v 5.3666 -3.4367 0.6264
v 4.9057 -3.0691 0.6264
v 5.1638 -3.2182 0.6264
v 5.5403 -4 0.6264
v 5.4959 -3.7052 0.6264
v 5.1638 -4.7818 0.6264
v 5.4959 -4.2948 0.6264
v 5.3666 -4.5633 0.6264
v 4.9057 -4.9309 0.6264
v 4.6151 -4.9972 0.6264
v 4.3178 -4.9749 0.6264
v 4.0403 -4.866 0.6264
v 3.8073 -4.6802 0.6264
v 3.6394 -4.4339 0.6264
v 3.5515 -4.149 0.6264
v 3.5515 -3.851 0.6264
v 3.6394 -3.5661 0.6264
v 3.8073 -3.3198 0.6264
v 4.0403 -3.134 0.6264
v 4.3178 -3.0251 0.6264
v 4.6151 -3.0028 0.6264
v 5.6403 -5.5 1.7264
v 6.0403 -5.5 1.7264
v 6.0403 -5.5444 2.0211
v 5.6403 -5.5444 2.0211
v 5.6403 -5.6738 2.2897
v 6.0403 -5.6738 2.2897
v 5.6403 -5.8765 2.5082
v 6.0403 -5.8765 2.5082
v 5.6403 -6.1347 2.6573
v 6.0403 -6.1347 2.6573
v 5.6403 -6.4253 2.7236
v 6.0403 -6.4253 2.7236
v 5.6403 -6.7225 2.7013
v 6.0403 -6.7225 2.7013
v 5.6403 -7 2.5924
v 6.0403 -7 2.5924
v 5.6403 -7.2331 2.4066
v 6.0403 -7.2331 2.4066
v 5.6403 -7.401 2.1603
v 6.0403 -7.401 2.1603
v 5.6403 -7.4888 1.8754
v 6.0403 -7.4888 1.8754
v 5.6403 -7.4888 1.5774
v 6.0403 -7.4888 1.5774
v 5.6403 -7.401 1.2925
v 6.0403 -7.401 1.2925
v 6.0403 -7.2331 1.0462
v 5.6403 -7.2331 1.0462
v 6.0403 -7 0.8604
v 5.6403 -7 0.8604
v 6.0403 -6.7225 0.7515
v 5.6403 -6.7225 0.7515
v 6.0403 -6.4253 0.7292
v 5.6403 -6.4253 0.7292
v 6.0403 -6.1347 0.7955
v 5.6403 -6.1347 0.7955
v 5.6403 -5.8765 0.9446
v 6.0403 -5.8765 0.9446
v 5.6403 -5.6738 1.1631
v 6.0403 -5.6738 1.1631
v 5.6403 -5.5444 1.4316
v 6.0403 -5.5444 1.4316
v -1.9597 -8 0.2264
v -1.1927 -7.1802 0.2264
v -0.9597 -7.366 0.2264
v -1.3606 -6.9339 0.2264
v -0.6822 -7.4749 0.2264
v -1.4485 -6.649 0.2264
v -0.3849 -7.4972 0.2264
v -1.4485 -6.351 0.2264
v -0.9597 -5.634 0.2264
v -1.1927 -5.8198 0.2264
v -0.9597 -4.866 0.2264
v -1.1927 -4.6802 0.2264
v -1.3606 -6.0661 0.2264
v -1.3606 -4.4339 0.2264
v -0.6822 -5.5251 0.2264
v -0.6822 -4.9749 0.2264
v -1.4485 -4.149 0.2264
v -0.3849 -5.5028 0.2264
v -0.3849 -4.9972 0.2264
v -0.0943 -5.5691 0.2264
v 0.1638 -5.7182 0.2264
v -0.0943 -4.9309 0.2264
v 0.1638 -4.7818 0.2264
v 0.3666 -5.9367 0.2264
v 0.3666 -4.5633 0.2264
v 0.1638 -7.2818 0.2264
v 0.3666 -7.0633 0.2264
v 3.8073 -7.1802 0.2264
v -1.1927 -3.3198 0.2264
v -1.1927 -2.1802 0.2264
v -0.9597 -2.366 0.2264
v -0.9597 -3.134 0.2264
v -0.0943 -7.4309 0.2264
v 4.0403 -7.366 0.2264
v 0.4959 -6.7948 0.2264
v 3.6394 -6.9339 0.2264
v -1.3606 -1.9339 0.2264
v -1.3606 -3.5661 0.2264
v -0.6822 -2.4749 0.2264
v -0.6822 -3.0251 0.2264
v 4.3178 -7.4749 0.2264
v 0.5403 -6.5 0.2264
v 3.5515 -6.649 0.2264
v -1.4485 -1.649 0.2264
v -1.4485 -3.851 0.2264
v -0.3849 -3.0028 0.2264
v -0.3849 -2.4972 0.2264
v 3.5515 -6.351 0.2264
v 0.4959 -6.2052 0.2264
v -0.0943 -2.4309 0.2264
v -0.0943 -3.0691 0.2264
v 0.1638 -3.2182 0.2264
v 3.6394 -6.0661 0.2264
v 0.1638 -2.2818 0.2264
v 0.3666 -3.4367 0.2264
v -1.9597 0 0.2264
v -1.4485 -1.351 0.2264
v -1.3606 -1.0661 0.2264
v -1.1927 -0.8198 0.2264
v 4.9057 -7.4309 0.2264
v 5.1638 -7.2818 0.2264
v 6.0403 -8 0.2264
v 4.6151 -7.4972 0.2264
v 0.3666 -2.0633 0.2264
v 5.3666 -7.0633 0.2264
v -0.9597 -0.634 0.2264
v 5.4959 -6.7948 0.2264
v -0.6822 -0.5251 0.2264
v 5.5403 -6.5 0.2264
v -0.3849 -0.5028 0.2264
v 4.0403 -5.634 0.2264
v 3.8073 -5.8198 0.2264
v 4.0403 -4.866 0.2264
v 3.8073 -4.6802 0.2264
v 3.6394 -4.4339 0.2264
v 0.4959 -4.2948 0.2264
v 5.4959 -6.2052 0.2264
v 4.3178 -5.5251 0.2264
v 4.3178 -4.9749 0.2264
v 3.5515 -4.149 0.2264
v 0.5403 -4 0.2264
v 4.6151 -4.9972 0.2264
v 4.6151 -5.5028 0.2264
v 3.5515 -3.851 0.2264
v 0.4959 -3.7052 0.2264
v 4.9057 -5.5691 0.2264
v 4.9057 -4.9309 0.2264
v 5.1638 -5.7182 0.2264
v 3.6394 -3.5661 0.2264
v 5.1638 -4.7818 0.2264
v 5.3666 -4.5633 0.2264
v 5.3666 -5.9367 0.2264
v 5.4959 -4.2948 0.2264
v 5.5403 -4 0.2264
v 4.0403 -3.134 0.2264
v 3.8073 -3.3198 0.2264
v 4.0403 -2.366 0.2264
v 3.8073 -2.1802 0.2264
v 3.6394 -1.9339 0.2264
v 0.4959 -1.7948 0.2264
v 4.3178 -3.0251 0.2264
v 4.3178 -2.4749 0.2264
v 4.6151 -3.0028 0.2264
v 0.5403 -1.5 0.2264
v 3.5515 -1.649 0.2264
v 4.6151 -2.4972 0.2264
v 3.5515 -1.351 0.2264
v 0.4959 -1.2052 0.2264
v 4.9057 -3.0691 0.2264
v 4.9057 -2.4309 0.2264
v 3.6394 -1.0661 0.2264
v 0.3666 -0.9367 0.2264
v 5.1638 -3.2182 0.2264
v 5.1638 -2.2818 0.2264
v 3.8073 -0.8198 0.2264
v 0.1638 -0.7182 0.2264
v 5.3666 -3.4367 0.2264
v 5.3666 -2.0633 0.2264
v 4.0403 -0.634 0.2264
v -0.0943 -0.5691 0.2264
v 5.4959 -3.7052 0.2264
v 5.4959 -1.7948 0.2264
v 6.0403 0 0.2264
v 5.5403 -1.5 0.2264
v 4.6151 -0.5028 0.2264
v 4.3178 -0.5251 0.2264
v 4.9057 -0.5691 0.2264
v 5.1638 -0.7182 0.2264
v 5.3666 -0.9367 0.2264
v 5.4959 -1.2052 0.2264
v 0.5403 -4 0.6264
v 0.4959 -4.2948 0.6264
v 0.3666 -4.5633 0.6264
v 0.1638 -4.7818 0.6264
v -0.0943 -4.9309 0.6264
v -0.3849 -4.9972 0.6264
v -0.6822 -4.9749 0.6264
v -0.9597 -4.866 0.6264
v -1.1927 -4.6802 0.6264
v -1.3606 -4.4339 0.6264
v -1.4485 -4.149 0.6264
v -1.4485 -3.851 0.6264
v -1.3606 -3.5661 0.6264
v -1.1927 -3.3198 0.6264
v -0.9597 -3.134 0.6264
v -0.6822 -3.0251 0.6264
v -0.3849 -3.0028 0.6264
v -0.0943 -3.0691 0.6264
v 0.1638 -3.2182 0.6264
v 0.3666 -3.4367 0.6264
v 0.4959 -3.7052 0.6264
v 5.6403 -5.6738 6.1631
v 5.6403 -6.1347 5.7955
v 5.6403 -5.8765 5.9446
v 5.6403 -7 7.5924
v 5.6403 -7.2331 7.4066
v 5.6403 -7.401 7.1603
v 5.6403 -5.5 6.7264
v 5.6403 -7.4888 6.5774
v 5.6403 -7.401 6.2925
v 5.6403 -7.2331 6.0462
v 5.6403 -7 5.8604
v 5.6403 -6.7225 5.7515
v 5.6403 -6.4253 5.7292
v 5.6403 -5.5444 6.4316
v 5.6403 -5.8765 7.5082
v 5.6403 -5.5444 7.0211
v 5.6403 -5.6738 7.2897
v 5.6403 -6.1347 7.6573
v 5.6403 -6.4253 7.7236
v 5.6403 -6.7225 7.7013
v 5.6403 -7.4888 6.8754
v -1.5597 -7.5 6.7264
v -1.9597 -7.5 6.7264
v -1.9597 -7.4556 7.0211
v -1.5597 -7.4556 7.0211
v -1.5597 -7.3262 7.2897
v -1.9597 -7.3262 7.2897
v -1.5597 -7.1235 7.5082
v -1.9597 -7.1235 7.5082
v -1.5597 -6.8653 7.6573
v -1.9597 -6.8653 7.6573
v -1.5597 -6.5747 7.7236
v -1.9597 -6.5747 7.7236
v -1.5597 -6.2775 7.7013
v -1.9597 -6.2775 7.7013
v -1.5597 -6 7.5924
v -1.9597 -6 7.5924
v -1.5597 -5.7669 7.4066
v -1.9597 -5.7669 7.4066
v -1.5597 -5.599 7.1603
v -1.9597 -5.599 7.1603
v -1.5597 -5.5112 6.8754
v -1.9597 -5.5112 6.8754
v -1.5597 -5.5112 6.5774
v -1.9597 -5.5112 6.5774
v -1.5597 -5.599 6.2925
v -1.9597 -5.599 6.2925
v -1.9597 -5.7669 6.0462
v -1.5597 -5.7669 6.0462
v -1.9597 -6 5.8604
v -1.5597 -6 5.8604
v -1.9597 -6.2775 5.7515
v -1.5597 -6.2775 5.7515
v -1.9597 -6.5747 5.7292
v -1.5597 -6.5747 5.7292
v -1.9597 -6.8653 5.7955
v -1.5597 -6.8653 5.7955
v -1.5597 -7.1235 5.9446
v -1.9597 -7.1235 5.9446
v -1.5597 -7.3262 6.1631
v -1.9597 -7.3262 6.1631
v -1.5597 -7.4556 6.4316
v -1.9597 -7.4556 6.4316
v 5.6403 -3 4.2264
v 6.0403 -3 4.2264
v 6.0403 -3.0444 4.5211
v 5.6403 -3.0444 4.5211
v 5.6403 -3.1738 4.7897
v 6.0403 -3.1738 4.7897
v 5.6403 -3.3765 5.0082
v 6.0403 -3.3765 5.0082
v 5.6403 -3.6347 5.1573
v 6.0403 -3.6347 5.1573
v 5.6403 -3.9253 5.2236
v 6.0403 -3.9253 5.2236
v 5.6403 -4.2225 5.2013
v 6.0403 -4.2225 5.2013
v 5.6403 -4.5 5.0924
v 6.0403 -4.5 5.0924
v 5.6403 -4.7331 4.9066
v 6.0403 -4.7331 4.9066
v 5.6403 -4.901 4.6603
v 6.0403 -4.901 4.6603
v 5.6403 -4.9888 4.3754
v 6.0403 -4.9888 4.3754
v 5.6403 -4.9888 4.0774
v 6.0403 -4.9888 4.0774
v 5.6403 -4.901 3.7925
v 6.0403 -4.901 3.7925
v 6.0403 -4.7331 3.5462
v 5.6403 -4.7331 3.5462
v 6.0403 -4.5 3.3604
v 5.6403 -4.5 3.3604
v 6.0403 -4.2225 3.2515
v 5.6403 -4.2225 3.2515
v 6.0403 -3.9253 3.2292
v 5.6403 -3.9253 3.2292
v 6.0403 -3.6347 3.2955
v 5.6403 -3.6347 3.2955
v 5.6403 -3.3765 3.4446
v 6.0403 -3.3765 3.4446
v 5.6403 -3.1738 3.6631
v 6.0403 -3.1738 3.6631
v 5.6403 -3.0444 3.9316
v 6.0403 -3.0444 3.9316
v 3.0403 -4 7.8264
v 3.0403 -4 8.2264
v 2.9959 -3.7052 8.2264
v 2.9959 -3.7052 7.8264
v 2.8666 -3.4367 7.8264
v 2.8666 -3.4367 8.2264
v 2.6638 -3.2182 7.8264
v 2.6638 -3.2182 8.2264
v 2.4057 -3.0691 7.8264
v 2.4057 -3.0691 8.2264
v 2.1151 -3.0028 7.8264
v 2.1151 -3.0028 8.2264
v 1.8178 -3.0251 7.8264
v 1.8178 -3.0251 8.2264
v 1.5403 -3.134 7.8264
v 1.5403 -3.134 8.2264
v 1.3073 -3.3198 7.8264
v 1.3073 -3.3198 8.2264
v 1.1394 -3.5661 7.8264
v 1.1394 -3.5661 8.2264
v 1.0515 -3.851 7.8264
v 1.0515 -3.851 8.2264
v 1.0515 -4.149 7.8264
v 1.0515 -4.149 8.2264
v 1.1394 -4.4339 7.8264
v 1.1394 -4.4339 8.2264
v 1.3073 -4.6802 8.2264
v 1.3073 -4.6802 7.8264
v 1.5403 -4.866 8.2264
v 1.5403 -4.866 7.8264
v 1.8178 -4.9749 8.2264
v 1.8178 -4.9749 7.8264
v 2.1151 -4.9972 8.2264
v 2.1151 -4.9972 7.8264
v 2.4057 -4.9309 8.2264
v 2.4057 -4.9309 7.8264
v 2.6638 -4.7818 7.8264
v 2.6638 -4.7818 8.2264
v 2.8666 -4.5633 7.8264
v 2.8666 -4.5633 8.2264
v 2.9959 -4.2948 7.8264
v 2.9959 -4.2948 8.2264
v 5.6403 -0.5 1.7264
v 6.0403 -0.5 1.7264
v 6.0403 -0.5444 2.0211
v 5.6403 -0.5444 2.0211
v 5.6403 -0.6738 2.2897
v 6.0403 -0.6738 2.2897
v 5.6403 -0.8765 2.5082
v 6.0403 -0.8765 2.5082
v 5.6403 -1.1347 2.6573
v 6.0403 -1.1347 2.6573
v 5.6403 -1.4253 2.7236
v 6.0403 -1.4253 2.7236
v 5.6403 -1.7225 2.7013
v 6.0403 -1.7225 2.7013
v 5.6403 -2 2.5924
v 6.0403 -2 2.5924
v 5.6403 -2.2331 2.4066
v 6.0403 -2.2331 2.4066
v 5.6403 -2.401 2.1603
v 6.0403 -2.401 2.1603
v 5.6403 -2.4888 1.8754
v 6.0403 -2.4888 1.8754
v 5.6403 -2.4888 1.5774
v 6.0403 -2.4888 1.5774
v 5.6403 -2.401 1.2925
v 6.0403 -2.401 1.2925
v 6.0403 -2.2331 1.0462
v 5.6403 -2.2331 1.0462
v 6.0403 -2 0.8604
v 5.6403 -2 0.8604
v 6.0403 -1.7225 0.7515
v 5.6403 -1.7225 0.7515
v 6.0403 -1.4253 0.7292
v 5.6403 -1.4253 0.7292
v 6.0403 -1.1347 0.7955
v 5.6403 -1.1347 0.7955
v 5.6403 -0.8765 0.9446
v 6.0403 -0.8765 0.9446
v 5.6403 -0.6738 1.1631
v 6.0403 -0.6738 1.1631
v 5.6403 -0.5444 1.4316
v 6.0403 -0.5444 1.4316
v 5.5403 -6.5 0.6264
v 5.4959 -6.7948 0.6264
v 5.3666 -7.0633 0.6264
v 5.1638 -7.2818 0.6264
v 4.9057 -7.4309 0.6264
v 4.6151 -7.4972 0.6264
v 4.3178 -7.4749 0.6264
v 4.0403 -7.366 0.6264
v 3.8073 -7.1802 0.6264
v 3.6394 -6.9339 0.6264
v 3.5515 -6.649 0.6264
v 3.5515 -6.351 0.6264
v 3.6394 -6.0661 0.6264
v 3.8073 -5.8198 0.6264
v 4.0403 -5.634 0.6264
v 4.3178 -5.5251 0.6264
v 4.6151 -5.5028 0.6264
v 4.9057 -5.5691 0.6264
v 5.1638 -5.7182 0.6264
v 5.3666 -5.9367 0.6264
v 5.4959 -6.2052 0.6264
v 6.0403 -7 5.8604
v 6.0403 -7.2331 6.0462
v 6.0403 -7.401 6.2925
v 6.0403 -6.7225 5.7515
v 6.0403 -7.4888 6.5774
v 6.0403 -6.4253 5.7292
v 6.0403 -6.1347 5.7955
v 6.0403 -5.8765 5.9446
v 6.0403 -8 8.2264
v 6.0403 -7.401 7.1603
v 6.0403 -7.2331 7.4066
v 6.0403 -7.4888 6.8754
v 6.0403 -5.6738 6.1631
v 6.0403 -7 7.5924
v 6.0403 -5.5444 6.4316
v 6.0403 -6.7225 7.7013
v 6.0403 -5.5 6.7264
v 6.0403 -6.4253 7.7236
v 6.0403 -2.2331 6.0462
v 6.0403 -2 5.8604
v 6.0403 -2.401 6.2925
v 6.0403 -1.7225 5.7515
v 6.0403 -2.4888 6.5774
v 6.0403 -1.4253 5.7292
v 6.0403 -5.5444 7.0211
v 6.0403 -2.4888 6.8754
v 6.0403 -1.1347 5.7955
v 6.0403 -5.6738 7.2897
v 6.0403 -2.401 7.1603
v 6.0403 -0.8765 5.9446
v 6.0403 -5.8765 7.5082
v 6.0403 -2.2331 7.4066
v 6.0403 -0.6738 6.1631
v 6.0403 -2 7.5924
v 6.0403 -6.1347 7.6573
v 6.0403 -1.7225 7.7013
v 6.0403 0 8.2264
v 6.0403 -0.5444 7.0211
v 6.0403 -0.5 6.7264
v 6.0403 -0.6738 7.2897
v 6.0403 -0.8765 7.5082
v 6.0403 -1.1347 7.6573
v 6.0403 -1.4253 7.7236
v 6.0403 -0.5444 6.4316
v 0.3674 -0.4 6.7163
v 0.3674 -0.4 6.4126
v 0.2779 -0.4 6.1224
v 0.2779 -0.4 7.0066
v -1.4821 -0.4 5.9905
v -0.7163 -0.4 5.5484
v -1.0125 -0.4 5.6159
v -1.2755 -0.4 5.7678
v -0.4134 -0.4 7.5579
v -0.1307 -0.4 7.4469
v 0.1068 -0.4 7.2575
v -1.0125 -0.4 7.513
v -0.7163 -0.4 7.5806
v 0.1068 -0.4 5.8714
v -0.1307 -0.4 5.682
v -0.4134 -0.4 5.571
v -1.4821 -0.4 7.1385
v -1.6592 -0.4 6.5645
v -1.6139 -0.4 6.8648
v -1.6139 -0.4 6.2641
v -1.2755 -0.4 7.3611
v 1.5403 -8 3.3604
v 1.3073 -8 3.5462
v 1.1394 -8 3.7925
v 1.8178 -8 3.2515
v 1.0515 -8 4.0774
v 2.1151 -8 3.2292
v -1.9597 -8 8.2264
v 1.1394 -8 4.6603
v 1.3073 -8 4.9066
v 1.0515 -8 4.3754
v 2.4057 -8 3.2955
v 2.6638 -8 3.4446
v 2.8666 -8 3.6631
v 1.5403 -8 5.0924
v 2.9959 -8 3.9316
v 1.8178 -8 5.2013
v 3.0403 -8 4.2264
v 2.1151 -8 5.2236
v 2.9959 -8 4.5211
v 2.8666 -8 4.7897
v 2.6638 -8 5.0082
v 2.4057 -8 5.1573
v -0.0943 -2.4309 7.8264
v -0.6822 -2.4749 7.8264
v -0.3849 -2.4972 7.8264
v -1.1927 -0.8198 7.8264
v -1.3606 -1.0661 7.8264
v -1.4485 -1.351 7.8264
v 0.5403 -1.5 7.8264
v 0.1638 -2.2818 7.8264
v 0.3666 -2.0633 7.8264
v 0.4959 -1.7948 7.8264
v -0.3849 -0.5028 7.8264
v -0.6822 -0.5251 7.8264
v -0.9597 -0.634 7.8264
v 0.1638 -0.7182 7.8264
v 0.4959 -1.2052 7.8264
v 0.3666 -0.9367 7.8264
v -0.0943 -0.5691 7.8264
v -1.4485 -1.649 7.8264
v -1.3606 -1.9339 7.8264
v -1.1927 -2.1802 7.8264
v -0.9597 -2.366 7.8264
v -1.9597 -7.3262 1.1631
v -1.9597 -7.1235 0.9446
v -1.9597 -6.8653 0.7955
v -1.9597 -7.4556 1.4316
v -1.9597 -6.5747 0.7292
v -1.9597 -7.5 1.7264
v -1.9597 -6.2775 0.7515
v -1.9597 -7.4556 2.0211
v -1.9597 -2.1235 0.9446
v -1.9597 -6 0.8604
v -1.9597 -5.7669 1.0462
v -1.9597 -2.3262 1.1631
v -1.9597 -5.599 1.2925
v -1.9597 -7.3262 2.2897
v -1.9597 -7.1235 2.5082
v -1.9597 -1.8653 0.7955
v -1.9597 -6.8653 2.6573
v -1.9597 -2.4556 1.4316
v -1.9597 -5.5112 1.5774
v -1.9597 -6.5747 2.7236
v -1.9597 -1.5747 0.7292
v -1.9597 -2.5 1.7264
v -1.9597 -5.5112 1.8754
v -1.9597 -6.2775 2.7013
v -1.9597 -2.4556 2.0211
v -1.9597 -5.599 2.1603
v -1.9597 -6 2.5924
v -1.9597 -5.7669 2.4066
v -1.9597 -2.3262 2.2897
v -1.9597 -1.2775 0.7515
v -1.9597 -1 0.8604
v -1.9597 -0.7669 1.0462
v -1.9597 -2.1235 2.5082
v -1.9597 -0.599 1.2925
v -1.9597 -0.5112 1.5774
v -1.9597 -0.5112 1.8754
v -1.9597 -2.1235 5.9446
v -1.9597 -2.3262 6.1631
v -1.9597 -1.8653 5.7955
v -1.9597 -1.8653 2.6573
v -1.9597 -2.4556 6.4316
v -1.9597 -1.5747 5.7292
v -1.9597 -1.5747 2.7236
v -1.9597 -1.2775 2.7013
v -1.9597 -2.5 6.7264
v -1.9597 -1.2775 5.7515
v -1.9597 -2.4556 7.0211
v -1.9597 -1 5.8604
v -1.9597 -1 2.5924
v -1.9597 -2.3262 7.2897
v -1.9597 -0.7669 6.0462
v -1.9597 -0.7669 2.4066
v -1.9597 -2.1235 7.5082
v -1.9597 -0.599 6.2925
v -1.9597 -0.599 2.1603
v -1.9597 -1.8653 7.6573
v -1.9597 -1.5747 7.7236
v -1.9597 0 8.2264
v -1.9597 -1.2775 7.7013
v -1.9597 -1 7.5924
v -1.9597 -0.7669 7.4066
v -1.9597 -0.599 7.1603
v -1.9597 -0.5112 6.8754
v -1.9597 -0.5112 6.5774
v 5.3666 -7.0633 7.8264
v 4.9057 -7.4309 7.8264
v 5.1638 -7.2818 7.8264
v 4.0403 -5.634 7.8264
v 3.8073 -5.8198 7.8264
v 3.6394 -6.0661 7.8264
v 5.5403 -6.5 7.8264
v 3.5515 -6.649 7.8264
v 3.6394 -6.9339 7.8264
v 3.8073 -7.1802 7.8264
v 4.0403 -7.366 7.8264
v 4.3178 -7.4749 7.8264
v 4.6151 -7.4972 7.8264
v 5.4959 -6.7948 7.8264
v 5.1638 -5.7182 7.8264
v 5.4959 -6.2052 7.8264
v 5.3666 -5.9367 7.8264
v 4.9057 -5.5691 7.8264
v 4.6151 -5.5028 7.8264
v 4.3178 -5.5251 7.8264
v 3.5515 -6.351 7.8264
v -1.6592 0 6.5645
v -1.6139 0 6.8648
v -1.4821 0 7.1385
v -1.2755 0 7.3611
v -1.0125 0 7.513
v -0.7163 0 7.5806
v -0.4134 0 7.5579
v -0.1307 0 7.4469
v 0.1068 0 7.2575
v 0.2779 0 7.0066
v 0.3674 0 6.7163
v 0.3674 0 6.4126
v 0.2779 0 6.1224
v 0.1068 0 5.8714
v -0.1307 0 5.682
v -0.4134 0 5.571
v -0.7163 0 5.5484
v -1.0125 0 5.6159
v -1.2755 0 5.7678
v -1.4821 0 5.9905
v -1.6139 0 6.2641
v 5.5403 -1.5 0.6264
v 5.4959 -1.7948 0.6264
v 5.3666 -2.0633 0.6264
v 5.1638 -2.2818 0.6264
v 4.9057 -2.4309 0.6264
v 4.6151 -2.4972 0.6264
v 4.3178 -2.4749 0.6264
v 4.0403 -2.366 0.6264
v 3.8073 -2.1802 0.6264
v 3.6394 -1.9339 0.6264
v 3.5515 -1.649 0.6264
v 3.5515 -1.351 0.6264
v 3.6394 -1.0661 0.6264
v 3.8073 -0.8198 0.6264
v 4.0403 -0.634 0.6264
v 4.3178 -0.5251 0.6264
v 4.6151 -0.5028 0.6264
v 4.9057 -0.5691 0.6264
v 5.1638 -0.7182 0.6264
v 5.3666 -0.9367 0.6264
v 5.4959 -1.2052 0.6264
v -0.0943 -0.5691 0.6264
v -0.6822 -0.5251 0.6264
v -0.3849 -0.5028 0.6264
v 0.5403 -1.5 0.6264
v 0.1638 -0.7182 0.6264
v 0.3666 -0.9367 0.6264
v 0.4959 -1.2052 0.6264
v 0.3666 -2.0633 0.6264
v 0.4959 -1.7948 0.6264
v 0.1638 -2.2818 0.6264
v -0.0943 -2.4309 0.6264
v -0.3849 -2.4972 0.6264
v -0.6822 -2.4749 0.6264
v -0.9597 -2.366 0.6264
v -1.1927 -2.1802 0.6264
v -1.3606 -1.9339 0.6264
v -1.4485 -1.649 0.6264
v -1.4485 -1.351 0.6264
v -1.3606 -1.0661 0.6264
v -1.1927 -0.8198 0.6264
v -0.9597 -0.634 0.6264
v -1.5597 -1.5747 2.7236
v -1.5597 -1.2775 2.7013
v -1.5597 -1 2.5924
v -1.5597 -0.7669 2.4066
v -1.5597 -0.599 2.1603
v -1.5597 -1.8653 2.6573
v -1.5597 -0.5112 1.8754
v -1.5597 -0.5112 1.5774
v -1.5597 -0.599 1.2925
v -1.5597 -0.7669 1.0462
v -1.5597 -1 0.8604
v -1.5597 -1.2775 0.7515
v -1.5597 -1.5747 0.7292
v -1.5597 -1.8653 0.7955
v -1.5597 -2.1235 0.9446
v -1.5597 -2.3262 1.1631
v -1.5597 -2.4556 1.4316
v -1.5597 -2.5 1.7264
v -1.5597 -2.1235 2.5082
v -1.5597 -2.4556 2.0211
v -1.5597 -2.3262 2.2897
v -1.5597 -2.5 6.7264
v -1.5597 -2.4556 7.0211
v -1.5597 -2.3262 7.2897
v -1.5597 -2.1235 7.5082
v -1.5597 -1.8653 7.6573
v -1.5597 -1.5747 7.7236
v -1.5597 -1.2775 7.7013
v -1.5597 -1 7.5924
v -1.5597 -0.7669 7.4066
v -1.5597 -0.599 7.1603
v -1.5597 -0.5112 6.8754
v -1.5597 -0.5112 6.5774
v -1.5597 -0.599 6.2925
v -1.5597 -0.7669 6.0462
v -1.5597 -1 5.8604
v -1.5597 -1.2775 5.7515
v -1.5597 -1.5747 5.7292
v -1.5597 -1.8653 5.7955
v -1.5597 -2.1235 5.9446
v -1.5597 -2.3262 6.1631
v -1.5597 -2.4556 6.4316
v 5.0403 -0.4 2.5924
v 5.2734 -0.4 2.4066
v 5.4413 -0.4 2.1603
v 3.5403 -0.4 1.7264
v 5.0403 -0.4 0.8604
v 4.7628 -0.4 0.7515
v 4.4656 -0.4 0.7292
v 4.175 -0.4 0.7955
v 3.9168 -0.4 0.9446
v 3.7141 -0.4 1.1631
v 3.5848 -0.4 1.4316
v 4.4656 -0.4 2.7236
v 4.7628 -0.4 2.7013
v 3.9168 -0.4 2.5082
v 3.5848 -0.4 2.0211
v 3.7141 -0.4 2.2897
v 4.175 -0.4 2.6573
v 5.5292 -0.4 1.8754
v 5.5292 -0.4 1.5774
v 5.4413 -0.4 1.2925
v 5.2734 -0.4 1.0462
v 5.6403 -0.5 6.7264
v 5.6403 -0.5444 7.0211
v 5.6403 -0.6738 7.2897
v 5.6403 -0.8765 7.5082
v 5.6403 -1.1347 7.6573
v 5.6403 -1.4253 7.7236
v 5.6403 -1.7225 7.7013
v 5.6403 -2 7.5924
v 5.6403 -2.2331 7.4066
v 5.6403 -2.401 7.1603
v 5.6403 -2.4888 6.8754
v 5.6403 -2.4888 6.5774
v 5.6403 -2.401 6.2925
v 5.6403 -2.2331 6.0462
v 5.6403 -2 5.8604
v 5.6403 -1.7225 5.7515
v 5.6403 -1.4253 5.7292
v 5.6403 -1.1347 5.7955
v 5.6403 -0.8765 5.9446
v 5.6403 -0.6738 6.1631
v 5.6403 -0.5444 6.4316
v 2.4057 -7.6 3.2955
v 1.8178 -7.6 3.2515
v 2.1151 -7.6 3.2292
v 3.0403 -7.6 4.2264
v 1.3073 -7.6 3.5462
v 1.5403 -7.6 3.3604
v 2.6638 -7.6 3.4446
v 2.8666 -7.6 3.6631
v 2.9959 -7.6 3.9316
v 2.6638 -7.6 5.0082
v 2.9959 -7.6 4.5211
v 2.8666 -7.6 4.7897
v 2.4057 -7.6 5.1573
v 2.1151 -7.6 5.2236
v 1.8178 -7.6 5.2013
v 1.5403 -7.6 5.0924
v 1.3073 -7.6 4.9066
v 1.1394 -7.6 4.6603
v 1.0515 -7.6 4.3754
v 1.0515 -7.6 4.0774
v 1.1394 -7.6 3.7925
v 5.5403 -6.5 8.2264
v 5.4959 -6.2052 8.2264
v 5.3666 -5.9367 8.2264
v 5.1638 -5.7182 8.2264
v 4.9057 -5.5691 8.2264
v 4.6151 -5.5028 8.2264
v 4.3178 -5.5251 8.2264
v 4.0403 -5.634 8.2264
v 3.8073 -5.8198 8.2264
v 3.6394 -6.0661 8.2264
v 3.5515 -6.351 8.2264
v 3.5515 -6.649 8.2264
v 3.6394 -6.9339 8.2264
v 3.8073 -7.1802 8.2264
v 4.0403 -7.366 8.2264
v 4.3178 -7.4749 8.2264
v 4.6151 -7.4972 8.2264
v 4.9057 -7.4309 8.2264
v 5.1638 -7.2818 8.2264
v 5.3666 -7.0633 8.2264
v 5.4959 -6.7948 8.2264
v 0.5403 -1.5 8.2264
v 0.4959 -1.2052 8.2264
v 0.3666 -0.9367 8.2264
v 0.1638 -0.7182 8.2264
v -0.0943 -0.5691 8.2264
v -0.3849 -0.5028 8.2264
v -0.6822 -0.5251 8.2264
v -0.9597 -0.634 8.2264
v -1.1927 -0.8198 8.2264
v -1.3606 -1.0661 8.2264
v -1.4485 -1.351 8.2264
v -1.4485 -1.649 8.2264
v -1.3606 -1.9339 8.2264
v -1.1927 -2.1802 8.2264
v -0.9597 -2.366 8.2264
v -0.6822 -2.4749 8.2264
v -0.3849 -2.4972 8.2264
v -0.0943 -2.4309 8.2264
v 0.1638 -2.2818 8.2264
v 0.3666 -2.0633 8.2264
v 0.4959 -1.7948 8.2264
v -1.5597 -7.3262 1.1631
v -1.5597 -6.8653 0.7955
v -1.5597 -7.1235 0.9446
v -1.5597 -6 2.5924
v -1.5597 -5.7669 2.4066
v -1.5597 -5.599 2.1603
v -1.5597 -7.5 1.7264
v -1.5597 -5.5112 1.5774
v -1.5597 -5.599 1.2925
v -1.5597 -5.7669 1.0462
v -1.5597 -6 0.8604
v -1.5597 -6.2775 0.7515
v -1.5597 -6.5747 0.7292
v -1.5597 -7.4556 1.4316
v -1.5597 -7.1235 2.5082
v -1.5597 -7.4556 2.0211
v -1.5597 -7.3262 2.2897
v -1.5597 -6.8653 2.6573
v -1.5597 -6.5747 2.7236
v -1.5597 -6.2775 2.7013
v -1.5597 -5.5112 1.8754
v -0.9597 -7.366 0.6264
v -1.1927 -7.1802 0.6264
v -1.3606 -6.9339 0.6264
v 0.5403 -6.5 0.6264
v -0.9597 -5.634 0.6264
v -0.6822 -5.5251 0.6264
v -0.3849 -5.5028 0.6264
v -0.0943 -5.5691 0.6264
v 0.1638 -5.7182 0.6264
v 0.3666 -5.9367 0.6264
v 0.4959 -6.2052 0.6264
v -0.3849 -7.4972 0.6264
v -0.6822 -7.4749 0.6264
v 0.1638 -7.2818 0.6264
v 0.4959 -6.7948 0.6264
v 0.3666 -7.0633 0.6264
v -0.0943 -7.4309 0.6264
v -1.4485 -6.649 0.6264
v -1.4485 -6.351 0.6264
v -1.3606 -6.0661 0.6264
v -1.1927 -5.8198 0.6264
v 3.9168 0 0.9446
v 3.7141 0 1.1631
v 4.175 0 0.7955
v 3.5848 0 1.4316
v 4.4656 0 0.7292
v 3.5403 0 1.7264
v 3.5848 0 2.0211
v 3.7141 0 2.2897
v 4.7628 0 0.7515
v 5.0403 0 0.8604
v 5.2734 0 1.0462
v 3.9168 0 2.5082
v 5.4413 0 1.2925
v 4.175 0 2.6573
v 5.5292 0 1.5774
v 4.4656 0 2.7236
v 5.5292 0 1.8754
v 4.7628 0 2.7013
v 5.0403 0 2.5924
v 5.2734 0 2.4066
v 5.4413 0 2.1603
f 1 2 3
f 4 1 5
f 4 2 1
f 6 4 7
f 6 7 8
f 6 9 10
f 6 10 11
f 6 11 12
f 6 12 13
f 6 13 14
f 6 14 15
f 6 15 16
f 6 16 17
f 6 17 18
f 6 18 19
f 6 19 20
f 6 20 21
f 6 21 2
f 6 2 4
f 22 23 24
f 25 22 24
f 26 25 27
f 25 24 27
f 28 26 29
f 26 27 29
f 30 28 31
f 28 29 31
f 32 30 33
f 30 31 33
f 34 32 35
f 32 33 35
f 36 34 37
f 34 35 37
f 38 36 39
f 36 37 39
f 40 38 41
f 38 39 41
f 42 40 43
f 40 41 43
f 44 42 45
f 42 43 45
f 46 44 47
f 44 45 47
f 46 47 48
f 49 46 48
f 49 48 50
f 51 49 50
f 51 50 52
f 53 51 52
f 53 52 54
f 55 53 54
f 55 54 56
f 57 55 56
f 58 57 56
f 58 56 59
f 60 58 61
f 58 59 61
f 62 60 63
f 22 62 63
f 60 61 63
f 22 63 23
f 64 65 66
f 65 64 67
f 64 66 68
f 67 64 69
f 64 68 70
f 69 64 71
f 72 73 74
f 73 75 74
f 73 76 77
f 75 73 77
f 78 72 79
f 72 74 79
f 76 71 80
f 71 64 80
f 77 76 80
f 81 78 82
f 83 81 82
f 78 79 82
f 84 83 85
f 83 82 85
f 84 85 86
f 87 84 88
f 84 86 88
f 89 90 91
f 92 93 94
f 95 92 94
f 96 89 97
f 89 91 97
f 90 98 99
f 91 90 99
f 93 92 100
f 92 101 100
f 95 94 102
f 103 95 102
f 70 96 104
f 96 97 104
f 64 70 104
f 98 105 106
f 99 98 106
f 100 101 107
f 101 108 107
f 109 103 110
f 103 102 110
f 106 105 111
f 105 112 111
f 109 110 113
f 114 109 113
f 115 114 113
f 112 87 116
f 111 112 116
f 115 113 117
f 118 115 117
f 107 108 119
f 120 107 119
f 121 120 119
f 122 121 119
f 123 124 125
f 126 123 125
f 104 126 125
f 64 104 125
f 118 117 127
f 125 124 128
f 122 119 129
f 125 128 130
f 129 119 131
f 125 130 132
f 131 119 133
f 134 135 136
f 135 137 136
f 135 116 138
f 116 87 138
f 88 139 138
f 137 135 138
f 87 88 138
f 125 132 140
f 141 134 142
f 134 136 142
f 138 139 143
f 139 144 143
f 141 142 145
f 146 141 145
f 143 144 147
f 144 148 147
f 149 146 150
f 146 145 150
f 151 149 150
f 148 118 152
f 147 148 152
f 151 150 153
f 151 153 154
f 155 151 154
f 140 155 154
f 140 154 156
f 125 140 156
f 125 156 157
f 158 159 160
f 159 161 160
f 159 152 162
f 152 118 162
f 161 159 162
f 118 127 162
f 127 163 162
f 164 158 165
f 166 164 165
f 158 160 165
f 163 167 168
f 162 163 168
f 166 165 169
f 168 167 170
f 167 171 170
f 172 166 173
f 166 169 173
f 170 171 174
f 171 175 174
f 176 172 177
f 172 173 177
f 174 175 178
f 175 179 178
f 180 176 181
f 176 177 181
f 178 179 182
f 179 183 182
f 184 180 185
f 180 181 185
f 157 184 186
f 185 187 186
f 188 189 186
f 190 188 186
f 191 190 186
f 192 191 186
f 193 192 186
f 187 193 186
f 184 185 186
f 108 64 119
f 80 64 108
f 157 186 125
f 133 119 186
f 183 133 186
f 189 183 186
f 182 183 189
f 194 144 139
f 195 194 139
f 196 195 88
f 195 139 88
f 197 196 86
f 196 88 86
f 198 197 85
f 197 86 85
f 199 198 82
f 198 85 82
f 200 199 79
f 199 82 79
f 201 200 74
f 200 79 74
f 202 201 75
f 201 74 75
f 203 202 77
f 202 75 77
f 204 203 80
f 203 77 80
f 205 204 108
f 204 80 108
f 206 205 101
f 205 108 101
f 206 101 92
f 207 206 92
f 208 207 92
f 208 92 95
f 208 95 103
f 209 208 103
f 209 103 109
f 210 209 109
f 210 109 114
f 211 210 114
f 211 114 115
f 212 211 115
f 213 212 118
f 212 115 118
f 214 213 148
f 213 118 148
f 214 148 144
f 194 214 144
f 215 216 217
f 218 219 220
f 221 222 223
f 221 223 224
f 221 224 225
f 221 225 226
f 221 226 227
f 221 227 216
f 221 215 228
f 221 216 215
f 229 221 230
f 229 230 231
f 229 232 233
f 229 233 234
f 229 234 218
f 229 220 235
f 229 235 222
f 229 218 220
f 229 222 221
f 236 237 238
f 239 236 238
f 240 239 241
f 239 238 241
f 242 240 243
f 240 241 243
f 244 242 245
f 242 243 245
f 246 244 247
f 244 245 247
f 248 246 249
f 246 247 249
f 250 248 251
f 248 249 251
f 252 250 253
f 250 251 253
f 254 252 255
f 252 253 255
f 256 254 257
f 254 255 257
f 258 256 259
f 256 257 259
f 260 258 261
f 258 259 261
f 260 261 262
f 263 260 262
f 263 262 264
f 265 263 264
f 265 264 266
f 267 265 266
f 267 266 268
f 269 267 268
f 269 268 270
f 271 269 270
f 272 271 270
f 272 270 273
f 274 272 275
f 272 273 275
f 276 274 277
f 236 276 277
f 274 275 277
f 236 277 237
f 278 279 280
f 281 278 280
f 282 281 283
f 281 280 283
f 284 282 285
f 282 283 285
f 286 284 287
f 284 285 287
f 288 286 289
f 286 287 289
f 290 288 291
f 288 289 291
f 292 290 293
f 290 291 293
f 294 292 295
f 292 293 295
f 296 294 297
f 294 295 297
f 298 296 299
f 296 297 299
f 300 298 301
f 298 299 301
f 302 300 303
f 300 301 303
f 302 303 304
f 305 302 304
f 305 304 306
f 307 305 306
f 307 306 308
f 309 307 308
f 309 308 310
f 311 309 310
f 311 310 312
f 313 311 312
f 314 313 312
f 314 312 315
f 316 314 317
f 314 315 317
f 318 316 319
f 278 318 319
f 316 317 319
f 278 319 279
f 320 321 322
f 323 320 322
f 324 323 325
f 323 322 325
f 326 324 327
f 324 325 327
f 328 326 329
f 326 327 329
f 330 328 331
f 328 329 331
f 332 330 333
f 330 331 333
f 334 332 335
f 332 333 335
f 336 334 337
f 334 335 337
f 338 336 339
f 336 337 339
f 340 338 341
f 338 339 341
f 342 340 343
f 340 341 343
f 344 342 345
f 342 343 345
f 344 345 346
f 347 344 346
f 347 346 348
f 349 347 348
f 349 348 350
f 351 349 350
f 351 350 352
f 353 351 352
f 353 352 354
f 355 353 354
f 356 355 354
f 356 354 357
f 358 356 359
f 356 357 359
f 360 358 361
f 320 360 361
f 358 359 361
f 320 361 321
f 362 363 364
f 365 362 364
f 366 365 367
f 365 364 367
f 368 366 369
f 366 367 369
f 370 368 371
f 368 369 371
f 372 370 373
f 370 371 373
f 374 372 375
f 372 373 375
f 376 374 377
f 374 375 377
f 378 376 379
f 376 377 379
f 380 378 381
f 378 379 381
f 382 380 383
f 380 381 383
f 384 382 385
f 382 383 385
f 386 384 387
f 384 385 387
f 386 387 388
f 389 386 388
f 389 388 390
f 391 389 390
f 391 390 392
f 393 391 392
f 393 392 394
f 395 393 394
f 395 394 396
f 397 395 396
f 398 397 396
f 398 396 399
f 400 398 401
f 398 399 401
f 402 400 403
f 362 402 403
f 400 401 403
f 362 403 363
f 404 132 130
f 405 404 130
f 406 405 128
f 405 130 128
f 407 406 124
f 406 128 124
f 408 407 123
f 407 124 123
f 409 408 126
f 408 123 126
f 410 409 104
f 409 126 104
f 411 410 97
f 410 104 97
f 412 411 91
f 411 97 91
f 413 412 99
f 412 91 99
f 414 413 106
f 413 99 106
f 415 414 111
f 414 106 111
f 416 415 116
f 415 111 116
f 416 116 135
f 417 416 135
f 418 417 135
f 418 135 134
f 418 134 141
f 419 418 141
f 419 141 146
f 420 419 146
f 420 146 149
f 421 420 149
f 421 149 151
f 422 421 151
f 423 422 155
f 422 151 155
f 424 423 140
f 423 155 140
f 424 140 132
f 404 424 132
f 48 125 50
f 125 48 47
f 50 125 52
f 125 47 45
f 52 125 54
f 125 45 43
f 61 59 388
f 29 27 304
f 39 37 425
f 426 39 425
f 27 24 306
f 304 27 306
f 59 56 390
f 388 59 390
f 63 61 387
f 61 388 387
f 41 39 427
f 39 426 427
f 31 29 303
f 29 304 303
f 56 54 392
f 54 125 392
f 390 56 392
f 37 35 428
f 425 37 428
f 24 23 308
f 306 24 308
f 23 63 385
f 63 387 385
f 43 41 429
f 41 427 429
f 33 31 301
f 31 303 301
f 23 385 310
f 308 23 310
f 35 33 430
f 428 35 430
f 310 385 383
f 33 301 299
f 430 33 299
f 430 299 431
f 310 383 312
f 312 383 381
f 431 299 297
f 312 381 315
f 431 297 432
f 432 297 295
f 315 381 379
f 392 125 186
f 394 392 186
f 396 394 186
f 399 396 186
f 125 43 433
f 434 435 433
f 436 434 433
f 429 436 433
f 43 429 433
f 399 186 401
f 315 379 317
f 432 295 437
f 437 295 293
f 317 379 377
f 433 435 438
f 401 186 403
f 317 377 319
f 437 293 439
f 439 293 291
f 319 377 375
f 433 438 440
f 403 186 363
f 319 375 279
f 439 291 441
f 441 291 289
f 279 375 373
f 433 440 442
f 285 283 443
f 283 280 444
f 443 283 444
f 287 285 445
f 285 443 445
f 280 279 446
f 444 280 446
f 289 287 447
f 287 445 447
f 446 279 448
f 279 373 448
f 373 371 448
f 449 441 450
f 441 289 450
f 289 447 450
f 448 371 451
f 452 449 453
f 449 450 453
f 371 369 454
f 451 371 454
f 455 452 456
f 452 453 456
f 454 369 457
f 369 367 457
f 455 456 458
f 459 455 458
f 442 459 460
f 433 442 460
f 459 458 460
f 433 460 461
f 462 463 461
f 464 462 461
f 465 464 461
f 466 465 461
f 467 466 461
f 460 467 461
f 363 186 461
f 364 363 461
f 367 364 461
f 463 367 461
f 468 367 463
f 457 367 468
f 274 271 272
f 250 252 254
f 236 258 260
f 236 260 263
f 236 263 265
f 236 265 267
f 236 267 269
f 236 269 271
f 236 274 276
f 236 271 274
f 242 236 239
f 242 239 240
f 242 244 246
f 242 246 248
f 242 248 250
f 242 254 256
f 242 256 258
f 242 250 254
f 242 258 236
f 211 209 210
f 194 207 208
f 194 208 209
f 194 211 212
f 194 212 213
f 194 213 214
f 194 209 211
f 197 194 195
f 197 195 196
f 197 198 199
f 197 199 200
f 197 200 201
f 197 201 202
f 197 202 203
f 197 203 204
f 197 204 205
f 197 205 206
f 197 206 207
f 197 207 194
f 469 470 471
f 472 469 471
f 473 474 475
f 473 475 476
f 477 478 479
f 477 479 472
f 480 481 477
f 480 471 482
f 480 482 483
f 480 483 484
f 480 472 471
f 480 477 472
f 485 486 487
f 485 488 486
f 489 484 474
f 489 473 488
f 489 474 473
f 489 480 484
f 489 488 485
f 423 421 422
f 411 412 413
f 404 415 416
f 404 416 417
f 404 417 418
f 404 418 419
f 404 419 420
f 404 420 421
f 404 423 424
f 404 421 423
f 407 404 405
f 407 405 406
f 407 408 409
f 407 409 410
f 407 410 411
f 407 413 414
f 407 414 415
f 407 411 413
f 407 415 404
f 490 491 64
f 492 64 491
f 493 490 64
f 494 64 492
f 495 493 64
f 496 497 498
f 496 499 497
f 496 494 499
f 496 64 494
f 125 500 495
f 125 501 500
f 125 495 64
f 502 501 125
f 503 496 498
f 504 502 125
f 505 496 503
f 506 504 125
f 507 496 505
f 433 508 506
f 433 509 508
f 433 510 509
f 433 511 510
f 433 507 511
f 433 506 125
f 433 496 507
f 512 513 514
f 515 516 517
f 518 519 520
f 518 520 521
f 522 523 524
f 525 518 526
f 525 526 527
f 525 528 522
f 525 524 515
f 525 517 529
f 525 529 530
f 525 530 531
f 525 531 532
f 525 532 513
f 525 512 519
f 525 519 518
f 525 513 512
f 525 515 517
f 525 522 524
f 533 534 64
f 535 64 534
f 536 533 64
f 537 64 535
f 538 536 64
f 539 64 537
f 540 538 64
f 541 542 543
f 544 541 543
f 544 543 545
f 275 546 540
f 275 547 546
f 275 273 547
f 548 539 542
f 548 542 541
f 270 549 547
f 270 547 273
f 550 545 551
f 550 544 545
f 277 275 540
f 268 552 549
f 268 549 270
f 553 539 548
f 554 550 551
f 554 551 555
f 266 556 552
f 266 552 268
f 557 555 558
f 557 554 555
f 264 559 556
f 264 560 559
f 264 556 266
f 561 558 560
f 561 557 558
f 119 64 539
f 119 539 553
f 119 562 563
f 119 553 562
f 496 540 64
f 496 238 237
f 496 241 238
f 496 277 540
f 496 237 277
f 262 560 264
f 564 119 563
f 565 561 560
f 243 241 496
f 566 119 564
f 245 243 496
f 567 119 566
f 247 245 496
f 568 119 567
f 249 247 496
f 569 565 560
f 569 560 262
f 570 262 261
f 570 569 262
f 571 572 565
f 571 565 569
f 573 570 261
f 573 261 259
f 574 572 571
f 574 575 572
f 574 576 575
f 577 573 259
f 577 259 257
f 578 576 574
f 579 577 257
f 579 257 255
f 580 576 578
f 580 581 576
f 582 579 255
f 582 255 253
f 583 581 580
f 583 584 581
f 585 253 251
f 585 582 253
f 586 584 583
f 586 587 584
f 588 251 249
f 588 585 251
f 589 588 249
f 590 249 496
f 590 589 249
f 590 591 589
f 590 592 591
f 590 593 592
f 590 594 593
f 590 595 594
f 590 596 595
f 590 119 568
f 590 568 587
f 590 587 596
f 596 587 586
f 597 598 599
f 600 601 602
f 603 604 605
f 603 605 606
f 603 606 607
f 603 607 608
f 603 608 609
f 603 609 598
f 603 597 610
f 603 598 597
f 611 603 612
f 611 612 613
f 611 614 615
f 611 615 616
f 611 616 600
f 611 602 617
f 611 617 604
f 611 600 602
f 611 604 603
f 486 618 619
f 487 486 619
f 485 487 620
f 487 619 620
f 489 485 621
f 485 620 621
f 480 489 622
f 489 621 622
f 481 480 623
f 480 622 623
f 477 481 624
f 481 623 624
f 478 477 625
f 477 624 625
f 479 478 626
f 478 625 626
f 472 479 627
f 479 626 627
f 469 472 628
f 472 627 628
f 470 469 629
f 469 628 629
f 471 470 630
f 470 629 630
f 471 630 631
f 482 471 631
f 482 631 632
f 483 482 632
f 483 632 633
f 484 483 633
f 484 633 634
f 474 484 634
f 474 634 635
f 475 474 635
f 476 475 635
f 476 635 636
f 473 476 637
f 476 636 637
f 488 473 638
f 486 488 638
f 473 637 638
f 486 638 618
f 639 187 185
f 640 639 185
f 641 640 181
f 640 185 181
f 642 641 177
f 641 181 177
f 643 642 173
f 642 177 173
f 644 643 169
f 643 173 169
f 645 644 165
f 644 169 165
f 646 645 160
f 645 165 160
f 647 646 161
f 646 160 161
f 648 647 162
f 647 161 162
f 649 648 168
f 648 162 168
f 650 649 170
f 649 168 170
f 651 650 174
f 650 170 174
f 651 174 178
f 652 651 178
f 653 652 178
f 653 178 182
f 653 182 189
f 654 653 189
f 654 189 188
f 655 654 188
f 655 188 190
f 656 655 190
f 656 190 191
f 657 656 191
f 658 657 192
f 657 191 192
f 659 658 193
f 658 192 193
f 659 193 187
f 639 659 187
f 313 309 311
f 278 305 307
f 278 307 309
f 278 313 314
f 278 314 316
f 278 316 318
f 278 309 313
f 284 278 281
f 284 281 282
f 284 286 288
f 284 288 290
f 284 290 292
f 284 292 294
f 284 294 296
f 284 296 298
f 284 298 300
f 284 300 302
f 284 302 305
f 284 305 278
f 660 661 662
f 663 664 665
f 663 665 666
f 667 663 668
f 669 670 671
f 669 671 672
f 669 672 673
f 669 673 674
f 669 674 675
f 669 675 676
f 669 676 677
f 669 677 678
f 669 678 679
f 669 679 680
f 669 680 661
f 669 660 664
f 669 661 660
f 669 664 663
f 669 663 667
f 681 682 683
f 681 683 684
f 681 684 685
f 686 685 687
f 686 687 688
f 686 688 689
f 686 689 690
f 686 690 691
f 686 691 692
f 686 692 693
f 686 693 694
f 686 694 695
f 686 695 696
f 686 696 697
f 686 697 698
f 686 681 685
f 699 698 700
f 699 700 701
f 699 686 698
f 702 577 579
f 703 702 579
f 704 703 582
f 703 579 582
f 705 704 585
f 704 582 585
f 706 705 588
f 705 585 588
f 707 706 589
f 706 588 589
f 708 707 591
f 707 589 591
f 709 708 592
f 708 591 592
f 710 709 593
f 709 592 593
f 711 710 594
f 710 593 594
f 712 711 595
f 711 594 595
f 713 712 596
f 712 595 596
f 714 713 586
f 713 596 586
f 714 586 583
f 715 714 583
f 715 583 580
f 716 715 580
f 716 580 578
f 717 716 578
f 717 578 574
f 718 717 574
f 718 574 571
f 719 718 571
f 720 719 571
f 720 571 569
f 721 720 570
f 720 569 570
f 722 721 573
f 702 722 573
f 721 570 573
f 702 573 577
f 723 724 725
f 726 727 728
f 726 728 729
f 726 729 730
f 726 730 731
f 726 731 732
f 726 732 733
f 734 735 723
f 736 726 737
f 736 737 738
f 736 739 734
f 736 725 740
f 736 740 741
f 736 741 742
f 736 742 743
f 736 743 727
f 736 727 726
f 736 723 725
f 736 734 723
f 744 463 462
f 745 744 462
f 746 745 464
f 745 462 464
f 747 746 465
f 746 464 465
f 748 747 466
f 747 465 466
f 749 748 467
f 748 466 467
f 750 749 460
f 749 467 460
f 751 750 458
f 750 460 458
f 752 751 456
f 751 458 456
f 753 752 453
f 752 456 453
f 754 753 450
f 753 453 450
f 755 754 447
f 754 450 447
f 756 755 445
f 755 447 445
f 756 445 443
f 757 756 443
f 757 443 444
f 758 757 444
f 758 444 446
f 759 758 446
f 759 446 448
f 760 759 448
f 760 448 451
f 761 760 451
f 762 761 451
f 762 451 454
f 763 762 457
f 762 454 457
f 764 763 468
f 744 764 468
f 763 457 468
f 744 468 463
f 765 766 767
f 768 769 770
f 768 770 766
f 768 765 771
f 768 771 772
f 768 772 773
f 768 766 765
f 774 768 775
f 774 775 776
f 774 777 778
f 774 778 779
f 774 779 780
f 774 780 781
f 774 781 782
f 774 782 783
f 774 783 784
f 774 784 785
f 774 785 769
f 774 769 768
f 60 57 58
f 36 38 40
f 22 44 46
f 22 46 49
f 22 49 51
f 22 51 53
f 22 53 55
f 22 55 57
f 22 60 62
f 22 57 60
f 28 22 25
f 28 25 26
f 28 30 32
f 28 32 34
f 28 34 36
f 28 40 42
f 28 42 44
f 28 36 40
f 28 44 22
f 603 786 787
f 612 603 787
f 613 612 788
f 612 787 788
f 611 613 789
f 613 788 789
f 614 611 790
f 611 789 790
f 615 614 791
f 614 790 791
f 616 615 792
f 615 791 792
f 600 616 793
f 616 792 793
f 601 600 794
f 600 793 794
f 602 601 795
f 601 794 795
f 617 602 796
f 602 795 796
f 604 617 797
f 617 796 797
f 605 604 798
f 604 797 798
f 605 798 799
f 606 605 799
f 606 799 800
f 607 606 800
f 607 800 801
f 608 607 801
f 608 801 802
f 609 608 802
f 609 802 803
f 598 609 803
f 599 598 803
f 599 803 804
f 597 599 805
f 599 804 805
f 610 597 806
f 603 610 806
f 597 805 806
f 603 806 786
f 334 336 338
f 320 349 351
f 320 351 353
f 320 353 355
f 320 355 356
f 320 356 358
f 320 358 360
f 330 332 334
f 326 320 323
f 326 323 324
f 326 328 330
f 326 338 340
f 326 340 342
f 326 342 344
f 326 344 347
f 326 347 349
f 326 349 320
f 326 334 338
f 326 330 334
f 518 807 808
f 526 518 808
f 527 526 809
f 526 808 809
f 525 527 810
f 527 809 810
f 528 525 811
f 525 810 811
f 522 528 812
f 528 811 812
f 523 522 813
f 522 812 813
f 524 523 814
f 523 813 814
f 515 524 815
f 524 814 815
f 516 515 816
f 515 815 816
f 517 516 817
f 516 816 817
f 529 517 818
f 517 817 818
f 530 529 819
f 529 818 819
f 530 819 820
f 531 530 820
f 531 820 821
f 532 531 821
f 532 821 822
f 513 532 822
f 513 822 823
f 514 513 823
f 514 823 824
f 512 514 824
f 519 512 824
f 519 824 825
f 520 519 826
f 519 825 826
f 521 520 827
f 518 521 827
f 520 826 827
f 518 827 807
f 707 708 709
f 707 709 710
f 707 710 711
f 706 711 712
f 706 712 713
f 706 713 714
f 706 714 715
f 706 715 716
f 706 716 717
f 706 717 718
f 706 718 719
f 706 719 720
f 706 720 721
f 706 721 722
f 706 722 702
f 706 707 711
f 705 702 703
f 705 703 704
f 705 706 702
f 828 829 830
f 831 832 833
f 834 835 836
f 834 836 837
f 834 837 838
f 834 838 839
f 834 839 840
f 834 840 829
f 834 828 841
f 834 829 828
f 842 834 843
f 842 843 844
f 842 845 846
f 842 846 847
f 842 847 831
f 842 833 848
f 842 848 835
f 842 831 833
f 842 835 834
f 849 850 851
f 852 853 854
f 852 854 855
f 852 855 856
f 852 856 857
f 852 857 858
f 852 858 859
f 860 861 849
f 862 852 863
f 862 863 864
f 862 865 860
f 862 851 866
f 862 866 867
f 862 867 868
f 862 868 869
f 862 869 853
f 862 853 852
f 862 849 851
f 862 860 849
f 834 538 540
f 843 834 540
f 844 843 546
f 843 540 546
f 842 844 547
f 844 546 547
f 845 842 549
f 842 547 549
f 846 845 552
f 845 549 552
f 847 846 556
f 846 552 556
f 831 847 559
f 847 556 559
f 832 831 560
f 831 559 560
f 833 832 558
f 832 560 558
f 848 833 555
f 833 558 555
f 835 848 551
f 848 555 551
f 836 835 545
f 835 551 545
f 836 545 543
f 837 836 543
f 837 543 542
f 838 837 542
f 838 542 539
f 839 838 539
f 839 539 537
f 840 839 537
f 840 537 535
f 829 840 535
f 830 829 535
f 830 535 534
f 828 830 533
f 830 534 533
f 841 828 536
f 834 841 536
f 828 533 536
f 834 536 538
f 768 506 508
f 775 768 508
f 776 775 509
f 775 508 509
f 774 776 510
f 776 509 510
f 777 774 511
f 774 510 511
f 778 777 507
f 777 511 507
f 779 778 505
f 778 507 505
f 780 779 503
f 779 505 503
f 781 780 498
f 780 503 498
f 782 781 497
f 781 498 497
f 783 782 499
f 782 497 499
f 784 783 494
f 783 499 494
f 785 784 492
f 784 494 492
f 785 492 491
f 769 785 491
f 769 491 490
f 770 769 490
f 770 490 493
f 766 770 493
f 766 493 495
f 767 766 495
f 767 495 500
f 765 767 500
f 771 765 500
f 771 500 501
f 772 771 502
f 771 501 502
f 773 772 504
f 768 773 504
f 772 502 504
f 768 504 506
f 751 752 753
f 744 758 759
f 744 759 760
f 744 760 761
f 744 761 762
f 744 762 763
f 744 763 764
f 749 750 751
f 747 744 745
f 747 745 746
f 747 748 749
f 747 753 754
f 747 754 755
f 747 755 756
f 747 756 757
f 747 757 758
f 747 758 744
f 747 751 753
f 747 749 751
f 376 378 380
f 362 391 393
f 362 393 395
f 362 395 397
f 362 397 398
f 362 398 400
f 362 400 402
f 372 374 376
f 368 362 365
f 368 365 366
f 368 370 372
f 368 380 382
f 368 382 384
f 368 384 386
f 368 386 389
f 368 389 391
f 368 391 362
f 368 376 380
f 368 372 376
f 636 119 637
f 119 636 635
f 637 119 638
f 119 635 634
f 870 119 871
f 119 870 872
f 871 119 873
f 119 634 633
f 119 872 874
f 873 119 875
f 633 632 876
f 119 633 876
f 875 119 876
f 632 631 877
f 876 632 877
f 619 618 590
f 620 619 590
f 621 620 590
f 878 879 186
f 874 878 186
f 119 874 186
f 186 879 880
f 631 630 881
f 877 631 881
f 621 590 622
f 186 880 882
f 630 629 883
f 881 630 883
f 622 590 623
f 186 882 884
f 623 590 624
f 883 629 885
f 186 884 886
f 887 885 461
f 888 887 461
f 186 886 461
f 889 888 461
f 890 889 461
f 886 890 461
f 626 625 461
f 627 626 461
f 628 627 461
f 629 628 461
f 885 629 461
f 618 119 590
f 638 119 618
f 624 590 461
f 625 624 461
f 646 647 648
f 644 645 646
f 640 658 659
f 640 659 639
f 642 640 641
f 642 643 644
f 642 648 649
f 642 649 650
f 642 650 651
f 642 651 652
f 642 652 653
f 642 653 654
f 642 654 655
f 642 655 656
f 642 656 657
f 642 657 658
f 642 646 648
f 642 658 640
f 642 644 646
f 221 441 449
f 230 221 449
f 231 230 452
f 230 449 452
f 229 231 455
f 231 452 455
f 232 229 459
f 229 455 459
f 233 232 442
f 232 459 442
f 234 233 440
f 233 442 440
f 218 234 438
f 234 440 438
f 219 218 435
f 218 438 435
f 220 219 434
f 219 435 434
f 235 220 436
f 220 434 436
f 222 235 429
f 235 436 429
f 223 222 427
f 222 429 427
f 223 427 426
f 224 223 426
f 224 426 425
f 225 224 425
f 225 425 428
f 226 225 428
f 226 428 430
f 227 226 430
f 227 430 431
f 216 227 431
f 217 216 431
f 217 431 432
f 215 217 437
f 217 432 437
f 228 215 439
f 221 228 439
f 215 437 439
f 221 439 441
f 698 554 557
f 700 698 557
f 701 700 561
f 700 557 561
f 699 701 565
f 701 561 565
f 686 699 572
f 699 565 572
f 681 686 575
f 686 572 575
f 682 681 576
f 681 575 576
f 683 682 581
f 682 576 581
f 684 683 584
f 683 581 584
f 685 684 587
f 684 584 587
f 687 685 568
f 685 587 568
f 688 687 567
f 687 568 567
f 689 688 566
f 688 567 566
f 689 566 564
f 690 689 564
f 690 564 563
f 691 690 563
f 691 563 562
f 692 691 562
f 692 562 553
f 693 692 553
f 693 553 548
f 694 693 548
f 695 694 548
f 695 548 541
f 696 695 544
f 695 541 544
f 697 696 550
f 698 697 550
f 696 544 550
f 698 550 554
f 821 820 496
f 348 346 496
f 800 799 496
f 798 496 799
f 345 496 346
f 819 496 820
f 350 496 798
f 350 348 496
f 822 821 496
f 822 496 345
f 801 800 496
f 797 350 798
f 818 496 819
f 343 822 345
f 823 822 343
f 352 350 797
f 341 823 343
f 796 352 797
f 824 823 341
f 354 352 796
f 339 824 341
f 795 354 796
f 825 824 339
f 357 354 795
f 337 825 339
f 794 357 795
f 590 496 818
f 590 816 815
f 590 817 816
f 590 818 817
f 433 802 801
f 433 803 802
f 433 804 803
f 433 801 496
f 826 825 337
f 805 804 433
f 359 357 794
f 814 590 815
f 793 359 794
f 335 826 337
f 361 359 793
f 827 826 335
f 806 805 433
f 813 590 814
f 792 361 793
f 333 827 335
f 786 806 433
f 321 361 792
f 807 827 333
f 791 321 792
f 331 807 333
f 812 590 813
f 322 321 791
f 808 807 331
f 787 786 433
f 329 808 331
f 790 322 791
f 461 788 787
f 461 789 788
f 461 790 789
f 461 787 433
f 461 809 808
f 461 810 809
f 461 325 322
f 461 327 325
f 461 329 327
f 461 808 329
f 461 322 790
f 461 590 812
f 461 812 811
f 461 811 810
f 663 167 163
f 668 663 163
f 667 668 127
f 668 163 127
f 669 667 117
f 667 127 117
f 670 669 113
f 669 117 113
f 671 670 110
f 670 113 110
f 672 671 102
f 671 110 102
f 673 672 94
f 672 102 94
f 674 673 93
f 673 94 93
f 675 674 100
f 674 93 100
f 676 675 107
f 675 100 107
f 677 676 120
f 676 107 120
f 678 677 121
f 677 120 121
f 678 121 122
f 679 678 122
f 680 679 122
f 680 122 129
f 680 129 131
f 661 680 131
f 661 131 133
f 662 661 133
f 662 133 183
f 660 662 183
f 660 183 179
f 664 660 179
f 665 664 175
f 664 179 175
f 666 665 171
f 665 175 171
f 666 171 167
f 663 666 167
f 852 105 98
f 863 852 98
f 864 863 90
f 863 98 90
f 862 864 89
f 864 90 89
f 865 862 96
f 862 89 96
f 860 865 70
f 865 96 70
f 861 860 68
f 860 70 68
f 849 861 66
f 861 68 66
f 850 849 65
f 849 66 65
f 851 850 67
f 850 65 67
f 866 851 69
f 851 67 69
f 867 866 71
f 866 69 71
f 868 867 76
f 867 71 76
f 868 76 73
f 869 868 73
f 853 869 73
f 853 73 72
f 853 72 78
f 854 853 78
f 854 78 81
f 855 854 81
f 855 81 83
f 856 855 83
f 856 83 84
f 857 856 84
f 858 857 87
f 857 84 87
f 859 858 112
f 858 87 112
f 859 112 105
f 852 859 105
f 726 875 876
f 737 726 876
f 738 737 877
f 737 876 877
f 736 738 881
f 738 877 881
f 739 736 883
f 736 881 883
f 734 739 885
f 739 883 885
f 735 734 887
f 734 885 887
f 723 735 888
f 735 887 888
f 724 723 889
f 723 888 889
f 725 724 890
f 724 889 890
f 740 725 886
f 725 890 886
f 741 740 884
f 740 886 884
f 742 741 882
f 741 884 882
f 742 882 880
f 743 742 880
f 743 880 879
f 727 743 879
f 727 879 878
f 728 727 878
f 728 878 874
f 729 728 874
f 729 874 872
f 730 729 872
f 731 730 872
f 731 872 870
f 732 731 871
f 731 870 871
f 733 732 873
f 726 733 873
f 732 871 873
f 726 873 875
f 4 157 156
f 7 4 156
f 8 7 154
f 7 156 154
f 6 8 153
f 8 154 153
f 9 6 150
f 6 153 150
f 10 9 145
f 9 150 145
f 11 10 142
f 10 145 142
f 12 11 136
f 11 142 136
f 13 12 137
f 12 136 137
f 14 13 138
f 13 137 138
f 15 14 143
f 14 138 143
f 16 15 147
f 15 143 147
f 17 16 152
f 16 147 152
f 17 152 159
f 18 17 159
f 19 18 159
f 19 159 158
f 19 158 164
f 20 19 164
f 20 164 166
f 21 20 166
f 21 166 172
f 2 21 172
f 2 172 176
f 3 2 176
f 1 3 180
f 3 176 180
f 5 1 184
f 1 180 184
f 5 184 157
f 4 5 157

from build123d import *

# Parameters (mm, degrees)
F0_W      = 8
F0_H      = 8
F1_DEPTH  = 8
F2_R      = 1
F3_DEPTH  = 0.4
F4_R      = 1
F4_R_2    = 1.018966
F5_DEPTH  = 0.4
F6_R      = 1
F7_DEPTH  = 0.4
F8_R      = 1
F9_DEPTH  = 0.4
F10_R     = 1
F11_DEPTH = 0.4
F12_R     = 1
F13_DEPTH = 0.4


with BuildPart() as f1:
    # F0 (on Front) → F1 (new body)
    with BuildSketch(Plane.XZ):
        with Locations((2.040328, 4.226393)):
            Rectangle(F0_W, F0_H)
    extrude(amount=F1_DEPTH)

    # F2 (on face) → F3 (cut)
    with BuildSketch(Plane.XZ.offset(8)):
        with Locations((2.040328, 4.226393)):
            Circle(F2_R)
    extrude(amount=-F3_DEPTH, mode=Mode.SUBTRACT)

    # F4 (on face) → F5 (cut)
    with BuildSketch(Plane(origin=(0, 0, 0), x_dir=(-1, 0, 0), z_dir=(0, 1, 0))):
        with Locations((-4.540328, 1.726393)):
            Circle(F4_R)
        with Locations((0.640184, 6.564468)):
            Circle(F4_R_2)
    extrude(amount=-F5_DEPTH, mode=Mode.SUBTRACT)

    # F6 (on face) → F7 (cut)
    with BuildSketch(Plane(origin=(-1.959672, 0, 0), x_dir=(0, -1, 0), z_dir=(-1, 0, 0))):
        with Locations((6.5, 6.726393)):
            Circle(F6_R)
        with Locations((1.5, 6.726393)):
            Circle(F6_R)
        with Locations((1.5, 1.726393)):
            Circle(F6_R)
        with Locations((6.5, 1.726393)):
            Circle(F6_R)
    extrude(amount=-F7_DEPTH, mode=Mode.SUBTRACT)

    # F8 (on face) → F9 (cut)
    with BuildSketch(Plane.YZ.offset(6.040328)):
        with Locations((-4, 4.226393)):
            Circle(F8_R)
        with Locations((-6.5, 6.726393)):
            Circle(F8_R)
        with Locations((-1.5, 6.726393)):
            Circle(F8_R)
        with Locations((-1.5, 1.726393)):
            Circle(F8_R)
        with Locations((-6.5, 1.726393)):
            Circle(F8_R)
    extrude(amount=-F9_DEPTH, mode=Mode.SUBTRACT)

    # F10 (on face) → F11 (cut)
    with BuildSketch(Plane.XY.offset(8.226393)):
        with Locations((-0.459672, -1.5)):
            Circle(F10_R)
        with Locations((2.040328, -4)):
            Circle(F10_R)
        with Locations((4.540328, -6.5)):
            Circle(F10_R)
    extrude(amount=-F11_DEPTH, mode=Mode.SUBTRACT)

    # F12 (on face) → F13 (cut)
    with BuildSketch(Plane(origin=(0, 0, 0.226393), x_dir=(1, 0, 0), z_dir=(0, 0, -1))):
        with Locations((-0.459672, 6.5)):
            Circle(F12_R)
        with Locations((-0.459672, 4)):
            Circle(F12_R)
        with Locations((-0.459672, 1.5)):
            Circle(F12_R)
        with Locations((4.540328, 1.5)):
            Circle(F12_R)
        with Locations((4.540328, 4)):
            Circle(F12_R)
        with Locations((4.540328, 6.5)):
            Circle(F12_R)
    extrude(amount=-F13_DEPTH, mode=Mode.SUBTRACT)


solid = f1.part
